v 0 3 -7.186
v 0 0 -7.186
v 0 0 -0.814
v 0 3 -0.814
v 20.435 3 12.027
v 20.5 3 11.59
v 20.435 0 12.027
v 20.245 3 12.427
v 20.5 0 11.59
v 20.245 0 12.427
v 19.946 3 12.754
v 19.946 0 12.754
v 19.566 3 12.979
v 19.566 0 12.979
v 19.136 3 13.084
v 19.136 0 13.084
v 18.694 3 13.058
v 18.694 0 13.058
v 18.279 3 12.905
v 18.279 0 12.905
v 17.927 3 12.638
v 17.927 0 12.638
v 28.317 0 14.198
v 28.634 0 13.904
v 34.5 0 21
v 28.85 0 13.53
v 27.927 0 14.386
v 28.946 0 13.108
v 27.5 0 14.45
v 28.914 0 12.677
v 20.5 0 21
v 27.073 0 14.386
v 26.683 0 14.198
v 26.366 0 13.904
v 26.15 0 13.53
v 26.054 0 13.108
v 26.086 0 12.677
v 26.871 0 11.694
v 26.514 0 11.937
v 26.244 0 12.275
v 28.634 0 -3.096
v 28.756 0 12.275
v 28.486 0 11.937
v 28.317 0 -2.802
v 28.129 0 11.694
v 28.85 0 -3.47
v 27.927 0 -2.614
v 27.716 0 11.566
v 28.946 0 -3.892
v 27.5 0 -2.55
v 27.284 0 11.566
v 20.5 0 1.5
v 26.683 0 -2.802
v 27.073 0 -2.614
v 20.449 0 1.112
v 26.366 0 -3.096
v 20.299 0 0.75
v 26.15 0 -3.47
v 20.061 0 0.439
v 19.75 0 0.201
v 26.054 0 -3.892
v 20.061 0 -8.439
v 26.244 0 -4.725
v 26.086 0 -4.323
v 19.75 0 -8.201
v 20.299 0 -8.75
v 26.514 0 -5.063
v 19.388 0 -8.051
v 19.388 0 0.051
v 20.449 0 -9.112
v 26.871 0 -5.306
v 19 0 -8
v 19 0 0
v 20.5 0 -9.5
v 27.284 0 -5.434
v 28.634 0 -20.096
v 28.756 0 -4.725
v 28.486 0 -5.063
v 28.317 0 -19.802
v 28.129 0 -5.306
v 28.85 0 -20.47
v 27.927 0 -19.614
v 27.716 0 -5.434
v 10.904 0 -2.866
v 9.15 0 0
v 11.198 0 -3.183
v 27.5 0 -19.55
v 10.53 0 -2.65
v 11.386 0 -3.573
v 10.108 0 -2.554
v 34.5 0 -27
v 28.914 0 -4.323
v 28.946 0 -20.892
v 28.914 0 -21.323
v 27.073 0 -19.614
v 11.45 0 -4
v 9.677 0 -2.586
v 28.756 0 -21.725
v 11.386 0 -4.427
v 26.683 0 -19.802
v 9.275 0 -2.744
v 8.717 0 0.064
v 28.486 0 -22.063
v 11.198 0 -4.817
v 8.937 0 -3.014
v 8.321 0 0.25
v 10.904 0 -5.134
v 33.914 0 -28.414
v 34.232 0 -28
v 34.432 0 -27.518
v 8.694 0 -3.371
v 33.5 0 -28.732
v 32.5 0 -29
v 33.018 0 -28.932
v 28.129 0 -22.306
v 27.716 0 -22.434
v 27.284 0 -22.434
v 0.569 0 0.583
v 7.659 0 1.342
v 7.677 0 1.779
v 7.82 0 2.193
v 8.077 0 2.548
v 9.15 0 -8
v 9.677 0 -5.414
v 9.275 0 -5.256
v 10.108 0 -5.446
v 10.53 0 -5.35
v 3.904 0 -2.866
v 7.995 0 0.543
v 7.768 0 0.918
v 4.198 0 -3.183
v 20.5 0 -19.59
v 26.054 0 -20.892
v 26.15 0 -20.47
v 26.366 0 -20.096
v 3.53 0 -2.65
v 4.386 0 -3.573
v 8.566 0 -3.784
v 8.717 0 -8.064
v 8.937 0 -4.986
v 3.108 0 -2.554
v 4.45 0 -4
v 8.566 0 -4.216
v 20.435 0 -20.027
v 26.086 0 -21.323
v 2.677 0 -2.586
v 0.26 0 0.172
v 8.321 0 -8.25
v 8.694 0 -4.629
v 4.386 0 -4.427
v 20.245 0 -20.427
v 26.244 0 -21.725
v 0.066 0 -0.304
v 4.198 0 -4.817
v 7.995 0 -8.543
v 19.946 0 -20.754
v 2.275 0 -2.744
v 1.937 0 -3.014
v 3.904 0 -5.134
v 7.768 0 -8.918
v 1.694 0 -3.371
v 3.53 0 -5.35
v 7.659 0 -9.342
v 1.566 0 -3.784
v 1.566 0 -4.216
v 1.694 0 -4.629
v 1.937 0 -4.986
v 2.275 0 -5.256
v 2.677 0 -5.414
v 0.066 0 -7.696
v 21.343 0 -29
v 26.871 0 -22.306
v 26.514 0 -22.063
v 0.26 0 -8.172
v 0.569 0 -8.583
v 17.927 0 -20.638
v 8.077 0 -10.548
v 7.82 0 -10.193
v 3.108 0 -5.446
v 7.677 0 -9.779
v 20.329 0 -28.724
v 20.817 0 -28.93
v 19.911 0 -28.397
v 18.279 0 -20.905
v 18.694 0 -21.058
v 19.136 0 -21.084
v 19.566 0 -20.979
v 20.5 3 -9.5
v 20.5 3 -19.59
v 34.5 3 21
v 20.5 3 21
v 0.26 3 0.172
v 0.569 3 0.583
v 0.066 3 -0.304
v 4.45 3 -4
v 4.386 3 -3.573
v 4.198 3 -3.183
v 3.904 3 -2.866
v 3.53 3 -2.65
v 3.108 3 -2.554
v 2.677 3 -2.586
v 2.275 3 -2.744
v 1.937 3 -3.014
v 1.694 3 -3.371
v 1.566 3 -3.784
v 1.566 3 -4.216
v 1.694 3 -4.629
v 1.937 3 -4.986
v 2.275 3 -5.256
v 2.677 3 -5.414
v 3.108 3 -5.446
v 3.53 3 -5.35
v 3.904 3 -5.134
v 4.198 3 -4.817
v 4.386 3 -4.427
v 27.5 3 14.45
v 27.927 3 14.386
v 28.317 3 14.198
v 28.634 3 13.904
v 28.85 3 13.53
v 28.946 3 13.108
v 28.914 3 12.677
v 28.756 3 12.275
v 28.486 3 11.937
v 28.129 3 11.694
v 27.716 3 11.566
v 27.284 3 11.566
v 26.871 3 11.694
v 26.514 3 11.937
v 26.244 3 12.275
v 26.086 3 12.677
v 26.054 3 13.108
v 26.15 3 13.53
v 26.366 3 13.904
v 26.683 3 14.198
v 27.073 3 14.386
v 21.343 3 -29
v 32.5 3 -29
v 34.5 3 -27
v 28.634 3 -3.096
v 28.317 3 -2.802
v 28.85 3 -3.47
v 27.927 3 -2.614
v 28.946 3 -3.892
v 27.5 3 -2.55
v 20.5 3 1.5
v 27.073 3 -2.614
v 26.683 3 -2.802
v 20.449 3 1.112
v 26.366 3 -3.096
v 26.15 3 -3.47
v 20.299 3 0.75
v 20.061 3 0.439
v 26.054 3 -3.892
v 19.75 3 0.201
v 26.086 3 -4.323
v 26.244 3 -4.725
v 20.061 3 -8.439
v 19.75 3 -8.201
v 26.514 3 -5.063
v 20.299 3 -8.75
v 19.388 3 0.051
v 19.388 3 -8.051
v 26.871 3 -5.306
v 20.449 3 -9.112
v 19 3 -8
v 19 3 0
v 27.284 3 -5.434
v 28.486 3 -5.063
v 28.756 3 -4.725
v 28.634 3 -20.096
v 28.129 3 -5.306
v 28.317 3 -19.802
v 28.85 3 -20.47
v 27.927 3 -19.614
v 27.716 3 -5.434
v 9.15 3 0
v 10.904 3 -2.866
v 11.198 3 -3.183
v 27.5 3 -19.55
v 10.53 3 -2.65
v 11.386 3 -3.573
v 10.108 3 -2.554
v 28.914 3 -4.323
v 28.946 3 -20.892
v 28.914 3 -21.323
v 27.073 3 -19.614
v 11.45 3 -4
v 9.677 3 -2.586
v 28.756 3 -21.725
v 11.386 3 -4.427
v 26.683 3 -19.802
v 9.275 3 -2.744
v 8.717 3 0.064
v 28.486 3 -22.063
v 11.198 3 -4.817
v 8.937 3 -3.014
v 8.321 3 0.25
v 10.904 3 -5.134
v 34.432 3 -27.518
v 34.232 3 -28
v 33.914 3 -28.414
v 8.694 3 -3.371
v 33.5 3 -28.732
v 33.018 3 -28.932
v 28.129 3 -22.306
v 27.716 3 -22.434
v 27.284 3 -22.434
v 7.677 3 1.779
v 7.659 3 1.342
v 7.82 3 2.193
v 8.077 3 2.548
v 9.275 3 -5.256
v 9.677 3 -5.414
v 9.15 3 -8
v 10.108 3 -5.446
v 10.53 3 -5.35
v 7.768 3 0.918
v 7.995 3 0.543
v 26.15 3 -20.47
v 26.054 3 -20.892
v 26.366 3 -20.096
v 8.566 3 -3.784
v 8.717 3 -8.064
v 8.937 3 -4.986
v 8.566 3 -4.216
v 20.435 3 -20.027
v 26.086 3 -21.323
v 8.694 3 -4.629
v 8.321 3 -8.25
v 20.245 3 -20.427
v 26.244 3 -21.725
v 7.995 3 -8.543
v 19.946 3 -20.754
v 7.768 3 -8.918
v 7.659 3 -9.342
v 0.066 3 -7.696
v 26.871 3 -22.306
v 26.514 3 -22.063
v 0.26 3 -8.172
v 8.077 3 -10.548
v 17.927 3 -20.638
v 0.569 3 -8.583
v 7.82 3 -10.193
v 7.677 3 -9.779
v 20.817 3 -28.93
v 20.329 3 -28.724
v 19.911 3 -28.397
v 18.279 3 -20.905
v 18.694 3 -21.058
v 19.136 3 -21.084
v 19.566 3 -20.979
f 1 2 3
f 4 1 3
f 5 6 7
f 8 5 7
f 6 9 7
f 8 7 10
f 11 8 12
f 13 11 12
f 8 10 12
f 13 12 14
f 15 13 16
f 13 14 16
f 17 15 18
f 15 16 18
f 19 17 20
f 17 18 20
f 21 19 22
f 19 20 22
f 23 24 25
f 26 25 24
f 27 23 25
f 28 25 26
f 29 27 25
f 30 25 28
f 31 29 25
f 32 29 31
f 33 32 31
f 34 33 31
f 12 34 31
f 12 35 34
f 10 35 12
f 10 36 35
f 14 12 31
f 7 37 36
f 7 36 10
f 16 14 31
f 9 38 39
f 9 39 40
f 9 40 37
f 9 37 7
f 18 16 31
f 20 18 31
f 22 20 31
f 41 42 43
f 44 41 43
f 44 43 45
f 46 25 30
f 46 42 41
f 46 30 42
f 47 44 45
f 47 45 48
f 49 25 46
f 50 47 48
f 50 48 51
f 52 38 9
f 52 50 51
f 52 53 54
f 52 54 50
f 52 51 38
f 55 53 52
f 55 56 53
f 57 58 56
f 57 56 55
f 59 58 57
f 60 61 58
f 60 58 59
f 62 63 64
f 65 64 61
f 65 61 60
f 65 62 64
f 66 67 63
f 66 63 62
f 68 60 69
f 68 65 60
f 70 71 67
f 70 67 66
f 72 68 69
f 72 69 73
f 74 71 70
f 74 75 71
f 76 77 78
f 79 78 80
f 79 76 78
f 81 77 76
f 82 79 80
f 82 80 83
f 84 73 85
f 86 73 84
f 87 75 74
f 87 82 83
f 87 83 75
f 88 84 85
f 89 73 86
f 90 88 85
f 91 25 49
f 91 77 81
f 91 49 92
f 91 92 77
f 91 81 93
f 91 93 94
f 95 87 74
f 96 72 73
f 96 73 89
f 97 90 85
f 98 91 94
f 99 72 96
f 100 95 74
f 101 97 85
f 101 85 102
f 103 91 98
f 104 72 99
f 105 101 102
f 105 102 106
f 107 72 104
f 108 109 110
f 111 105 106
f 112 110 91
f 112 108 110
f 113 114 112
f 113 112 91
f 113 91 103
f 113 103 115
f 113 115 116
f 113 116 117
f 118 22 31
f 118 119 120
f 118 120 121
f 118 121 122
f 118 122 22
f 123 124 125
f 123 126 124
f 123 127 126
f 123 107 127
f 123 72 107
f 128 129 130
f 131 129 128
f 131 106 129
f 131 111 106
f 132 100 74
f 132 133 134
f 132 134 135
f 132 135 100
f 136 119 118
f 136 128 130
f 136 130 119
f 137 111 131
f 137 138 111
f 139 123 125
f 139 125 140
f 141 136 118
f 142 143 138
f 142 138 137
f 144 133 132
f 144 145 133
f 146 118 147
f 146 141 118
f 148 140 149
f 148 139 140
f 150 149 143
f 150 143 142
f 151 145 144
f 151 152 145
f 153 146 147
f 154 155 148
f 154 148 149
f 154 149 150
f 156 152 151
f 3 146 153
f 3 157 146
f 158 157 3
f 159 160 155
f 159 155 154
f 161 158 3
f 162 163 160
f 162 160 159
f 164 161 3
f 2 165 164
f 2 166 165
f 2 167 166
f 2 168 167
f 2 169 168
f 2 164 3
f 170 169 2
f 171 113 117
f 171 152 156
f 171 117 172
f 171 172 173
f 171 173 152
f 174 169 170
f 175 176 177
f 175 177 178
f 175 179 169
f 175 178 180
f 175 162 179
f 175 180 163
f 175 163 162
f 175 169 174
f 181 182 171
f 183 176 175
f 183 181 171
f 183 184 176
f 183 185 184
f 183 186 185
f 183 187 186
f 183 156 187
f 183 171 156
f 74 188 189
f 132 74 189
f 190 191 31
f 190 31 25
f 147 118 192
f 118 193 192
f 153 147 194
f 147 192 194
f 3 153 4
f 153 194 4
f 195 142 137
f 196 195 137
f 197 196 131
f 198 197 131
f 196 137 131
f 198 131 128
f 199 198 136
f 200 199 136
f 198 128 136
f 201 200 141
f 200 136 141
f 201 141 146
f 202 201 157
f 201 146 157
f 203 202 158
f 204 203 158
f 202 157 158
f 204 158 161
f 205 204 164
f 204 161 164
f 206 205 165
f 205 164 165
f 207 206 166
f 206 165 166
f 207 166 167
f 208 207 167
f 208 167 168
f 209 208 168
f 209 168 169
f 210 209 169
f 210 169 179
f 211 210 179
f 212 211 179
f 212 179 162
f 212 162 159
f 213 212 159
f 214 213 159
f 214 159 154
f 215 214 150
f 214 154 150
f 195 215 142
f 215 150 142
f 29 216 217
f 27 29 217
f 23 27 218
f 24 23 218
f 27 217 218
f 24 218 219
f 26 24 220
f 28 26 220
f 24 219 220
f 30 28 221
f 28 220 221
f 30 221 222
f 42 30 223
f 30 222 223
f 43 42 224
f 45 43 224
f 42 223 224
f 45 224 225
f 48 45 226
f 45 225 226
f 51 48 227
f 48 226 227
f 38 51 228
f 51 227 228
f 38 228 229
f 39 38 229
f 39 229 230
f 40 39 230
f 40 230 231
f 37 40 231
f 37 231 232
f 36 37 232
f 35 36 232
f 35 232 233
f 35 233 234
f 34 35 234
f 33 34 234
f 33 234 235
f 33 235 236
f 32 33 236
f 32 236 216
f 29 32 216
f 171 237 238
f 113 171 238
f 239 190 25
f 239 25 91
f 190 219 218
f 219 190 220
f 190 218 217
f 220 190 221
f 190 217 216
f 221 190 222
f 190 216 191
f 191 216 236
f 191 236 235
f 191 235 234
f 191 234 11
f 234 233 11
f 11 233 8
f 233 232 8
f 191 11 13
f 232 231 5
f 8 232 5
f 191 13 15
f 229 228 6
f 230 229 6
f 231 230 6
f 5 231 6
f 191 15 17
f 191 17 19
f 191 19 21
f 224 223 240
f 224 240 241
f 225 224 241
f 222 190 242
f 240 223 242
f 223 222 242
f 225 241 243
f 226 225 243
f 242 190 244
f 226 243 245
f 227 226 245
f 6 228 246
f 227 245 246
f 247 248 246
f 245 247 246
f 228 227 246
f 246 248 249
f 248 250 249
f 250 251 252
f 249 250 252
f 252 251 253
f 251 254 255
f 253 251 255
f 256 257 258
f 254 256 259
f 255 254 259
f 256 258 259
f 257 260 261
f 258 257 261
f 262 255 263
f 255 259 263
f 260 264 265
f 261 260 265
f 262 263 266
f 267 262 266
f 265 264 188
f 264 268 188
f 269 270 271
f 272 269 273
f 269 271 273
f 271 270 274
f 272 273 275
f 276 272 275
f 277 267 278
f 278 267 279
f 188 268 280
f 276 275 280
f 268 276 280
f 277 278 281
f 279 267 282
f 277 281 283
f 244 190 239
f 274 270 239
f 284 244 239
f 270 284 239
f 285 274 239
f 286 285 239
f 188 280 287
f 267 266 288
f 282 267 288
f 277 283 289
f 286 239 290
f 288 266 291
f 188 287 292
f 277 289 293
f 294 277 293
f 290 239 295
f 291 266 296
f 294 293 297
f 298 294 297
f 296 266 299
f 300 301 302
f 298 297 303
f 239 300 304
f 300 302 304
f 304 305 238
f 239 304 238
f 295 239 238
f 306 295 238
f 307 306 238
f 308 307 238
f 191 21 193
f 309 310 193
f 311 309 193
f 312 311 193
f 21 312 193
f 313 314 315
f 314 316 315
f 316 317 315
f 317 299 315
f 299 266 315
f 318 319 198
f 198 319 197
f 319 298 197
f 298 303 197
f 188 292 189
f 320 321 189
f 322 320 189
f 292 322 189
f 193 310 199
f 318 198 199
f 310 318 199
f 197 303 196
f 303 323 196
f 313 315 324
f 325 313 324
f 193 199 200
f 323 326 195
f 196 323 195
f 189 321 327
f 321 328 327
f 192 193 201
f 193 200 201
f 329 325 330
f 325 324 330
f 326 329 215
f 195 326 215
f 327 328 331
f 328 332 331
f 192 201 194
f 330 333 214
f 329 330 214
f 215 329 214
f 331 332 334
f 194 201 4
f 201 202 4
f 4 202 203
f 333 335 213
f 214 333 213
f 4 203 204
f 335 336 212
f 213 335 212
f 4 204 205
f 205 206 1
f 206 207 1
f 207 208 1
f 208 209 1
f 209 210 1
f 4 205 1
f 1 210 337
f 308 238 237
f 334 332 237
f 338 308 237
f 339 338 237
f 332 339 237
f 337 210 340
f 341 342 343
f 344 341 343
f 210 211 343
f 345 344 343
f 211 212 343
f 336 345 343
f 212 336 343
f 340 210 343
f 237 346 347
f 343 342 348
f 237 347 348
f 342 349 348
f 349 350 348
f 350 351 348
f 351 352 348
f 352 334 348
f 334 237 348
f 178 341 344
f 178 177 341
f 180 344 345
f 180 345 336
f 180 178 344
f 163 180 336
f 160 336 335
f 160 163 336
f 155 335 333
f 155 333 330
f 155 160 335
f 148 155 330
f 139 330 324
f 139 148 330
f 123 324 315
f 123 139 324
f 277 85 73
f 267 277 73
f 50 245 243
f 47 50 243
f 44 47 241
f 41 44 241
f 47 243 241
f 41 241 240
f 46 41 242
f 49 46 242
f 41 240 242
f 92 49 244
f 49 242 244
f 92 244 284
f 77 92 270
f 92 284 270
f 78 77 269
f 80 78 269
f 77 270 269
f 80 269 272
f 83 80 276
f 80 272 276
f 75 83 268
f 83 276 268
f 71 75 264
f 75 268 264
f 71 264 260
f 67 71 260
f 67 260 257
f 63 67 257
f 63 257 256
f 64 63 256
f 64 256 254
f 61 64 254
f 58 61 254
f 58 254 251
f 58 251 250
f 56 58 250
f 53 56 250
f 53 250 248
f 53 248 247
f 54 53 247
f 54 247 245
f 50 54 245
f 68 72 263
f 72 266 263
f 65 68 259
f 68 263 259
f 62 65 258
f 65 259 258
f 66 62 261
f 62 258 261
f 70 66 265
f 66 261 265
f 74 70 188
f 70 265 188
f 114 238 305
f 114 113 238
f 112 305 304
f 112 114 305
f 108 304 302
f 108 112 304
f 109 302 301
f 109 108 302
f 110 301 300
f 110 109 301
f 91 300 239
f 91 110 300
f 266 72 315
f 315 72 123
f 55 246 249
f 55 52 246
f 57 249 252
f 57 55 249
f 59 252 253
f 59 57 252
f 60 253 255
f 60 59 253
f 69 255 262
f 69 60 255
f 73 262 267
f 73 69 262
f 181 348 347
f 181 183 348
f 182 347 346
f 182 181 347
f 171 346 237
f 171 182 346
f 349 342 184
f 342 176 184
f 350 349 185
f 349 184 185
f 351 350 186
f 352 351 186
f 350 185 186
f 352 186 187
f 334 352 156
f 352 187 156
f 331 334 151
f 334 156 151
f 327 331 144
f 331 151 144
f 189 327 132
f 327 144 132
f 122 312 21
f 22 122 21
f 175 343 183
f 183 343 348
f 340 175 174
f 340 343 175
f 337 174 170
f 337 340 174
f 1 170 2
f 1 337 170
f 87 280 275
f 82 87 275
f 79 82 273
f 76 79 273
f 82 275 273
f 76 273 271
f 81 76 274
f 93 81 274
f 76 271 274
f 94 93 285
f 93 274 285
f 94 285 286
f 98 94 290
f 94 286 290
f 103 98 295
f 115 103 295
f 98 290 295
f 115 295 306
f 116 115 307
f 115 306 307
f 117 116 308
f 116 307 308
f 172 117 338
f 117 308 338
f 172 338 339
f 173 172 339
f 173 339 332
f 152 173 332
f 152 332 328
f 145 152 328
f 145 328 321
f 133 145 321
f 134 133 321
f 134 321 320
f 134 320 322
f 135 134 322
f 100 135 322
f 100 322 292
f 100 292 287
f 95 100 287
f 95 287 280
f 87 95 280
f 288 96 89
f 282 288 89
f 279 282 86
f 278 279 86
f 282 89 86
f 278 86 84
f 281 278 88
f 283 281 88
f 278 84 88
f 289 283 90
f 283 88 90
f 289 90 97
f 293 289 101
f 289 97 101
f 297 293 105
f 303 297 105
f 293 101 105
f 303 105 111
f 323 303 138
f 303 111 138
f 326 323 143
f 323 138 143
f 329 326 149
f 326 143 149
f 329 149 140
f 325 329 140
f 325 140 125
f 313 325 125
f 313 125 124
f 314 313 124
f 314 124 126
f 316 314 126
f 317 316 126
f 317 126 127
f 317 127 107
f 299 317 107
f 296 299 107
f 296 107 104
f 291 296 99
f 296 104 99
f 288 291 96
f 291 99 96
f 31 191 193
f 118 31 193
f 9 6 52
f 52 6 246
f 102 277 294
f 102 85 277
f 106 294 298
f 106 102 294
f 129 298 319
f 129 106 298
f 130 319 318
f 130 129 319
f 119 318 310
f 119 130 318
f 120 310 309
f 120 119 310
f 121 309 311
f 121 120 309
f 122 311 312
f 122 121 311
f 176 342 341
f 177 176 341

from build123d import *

# Parameters (mm, degrees)
EXTRUDE_1_DEPTH     = 3
SKETCH_2_W          = 14
SKETCH_2_H          = 50
EXTRUDE_2_DEPTH     = 3
SKETCH_3_R          = 1.45
CUT_EXTRUDE_1_DEPTH = 46.169126624
EXTRUDE_3_DEPTH     = 3
FILLET_1_R          = 1.5
FILLET_2_R          = 2


with BuildPart() as part:
    # 草图1 → 凸台-拉伸1 (new body)
    with BuildSketch(Plane(origin=(0, 0, 0), x_dir=(1, 0, 0), z_dir=(0, 1, 0))):
        with BuildLine():
            ThreePointArc((8.55, 4), (10, 5.45), (11.45, 4))
            Line((11.45, 4), (27.5, 4))
            Line((27.5, 4), (27.5, 8))
            Line((27.5, 8), (0, 8))
            Line((0, 8), (0, 4))
            Line((0, 4), (1.55, 4))
            ThreePointArc((1.55, 4), (3, 5.45), (4.45, 4))
            Line((4.45, 4), (8.55, 4))
        make_face()
        with BuildLine():
            Line((27.5, 4), (11.45, 4))
            ThreePointArc((11.45, 4), (10, 2.55), (8.55, 4))
            Line((8.55, 4), (4.45, 4))
            ThreePointArc((4.45, 4), (3, 2.55), (1.55, 4))
            Line((1.55, 4), (0, 4))
            Line((0, 4), (0, 0))
            Line((0, 0), (27.5, 0))
            Line((27.5, 0), (27.5, 4))
        make_face()
    extrude(amount=EXTRUDE_1_DEPTH)

    # 草图2 → 凸台-拉伸2 (add)
    with BuildSketch(Plane(origin=(0, 3, 0), x_dir=(1, 0, 0), z_dir=(0, 1, 0))):
        with Locations((27.5, 4)):
            Rectangle(SKETCH_2_W, SKETCH_2_H)
    extrude(amount=-EXTRUDE_2_DEPTH)

    # 草图3 → 切除-拉伸1 (cut, through all)
    with BuildSketch(Plane(origin=(0, 3, 0), x_dir=(1, 0, 0), z_dir=(0, 1, 0))):
        with Locations(Location((27.5, 21, 0), (0, 0, 270))):
            Circle(SKETCH_3_R)
        with Locations(Location((27.5, 4, 0), (0, 0, 270))):
            Circle(SKETCH_3_R)
        with Locations(Location((27.5, -13, 0), (0, 0, 270))):
            Circle(SKETCH_3_R)
    extrude(amount=-CUT_EXTRUDE_1_DEPTH, mode=Mode.SUBTRACT)

    # 草图4 → 凸台-拉伸3 (add)
    with BuildSketch(Plane(origin=(0, 3, 0), x_dir=(1, 0, 0), z_dir=(0, 1, 0))):
        Polygon((0, 8), (20.5, 29), (20.5, 23.27374416), (5.589916416, 8), align=None)
        Polygon((20.5, -21), (0, 0), (5.589916416, 0), (20.5, -15.27374416), align=None)
    extrude(amount=-EXTRUDE_3_DEPTH)

    # 圆角1
    fillet_1_edges = [part.edges().sort_by_distance(p)[0] for p in [
        (20.5, 1.5, 0),
        (20.5, 1.5, -8),
        (5.589916416, 1.5, -8),
        (20.5, 1.5, -23.27374416),
        (20.5, 1.5, 15.27374416),
        (5.589916416, 1.5, 0),
    ]]
    fillet(fillet_1_edges, radius=FILLET_1_R)

    # 圆角2
    fillet_2_edges = [part.edges().sort_by_distance(p)[0] for p in [
        (0, 1.5, -8),
        (0, 1.5, 0),
        (20.5, 1.5, -29),
        (34.5, 1.5, -29),
    ]]
    fillet(fillet_2_edges, radius=FILLET_2_R)


solid = part.part
